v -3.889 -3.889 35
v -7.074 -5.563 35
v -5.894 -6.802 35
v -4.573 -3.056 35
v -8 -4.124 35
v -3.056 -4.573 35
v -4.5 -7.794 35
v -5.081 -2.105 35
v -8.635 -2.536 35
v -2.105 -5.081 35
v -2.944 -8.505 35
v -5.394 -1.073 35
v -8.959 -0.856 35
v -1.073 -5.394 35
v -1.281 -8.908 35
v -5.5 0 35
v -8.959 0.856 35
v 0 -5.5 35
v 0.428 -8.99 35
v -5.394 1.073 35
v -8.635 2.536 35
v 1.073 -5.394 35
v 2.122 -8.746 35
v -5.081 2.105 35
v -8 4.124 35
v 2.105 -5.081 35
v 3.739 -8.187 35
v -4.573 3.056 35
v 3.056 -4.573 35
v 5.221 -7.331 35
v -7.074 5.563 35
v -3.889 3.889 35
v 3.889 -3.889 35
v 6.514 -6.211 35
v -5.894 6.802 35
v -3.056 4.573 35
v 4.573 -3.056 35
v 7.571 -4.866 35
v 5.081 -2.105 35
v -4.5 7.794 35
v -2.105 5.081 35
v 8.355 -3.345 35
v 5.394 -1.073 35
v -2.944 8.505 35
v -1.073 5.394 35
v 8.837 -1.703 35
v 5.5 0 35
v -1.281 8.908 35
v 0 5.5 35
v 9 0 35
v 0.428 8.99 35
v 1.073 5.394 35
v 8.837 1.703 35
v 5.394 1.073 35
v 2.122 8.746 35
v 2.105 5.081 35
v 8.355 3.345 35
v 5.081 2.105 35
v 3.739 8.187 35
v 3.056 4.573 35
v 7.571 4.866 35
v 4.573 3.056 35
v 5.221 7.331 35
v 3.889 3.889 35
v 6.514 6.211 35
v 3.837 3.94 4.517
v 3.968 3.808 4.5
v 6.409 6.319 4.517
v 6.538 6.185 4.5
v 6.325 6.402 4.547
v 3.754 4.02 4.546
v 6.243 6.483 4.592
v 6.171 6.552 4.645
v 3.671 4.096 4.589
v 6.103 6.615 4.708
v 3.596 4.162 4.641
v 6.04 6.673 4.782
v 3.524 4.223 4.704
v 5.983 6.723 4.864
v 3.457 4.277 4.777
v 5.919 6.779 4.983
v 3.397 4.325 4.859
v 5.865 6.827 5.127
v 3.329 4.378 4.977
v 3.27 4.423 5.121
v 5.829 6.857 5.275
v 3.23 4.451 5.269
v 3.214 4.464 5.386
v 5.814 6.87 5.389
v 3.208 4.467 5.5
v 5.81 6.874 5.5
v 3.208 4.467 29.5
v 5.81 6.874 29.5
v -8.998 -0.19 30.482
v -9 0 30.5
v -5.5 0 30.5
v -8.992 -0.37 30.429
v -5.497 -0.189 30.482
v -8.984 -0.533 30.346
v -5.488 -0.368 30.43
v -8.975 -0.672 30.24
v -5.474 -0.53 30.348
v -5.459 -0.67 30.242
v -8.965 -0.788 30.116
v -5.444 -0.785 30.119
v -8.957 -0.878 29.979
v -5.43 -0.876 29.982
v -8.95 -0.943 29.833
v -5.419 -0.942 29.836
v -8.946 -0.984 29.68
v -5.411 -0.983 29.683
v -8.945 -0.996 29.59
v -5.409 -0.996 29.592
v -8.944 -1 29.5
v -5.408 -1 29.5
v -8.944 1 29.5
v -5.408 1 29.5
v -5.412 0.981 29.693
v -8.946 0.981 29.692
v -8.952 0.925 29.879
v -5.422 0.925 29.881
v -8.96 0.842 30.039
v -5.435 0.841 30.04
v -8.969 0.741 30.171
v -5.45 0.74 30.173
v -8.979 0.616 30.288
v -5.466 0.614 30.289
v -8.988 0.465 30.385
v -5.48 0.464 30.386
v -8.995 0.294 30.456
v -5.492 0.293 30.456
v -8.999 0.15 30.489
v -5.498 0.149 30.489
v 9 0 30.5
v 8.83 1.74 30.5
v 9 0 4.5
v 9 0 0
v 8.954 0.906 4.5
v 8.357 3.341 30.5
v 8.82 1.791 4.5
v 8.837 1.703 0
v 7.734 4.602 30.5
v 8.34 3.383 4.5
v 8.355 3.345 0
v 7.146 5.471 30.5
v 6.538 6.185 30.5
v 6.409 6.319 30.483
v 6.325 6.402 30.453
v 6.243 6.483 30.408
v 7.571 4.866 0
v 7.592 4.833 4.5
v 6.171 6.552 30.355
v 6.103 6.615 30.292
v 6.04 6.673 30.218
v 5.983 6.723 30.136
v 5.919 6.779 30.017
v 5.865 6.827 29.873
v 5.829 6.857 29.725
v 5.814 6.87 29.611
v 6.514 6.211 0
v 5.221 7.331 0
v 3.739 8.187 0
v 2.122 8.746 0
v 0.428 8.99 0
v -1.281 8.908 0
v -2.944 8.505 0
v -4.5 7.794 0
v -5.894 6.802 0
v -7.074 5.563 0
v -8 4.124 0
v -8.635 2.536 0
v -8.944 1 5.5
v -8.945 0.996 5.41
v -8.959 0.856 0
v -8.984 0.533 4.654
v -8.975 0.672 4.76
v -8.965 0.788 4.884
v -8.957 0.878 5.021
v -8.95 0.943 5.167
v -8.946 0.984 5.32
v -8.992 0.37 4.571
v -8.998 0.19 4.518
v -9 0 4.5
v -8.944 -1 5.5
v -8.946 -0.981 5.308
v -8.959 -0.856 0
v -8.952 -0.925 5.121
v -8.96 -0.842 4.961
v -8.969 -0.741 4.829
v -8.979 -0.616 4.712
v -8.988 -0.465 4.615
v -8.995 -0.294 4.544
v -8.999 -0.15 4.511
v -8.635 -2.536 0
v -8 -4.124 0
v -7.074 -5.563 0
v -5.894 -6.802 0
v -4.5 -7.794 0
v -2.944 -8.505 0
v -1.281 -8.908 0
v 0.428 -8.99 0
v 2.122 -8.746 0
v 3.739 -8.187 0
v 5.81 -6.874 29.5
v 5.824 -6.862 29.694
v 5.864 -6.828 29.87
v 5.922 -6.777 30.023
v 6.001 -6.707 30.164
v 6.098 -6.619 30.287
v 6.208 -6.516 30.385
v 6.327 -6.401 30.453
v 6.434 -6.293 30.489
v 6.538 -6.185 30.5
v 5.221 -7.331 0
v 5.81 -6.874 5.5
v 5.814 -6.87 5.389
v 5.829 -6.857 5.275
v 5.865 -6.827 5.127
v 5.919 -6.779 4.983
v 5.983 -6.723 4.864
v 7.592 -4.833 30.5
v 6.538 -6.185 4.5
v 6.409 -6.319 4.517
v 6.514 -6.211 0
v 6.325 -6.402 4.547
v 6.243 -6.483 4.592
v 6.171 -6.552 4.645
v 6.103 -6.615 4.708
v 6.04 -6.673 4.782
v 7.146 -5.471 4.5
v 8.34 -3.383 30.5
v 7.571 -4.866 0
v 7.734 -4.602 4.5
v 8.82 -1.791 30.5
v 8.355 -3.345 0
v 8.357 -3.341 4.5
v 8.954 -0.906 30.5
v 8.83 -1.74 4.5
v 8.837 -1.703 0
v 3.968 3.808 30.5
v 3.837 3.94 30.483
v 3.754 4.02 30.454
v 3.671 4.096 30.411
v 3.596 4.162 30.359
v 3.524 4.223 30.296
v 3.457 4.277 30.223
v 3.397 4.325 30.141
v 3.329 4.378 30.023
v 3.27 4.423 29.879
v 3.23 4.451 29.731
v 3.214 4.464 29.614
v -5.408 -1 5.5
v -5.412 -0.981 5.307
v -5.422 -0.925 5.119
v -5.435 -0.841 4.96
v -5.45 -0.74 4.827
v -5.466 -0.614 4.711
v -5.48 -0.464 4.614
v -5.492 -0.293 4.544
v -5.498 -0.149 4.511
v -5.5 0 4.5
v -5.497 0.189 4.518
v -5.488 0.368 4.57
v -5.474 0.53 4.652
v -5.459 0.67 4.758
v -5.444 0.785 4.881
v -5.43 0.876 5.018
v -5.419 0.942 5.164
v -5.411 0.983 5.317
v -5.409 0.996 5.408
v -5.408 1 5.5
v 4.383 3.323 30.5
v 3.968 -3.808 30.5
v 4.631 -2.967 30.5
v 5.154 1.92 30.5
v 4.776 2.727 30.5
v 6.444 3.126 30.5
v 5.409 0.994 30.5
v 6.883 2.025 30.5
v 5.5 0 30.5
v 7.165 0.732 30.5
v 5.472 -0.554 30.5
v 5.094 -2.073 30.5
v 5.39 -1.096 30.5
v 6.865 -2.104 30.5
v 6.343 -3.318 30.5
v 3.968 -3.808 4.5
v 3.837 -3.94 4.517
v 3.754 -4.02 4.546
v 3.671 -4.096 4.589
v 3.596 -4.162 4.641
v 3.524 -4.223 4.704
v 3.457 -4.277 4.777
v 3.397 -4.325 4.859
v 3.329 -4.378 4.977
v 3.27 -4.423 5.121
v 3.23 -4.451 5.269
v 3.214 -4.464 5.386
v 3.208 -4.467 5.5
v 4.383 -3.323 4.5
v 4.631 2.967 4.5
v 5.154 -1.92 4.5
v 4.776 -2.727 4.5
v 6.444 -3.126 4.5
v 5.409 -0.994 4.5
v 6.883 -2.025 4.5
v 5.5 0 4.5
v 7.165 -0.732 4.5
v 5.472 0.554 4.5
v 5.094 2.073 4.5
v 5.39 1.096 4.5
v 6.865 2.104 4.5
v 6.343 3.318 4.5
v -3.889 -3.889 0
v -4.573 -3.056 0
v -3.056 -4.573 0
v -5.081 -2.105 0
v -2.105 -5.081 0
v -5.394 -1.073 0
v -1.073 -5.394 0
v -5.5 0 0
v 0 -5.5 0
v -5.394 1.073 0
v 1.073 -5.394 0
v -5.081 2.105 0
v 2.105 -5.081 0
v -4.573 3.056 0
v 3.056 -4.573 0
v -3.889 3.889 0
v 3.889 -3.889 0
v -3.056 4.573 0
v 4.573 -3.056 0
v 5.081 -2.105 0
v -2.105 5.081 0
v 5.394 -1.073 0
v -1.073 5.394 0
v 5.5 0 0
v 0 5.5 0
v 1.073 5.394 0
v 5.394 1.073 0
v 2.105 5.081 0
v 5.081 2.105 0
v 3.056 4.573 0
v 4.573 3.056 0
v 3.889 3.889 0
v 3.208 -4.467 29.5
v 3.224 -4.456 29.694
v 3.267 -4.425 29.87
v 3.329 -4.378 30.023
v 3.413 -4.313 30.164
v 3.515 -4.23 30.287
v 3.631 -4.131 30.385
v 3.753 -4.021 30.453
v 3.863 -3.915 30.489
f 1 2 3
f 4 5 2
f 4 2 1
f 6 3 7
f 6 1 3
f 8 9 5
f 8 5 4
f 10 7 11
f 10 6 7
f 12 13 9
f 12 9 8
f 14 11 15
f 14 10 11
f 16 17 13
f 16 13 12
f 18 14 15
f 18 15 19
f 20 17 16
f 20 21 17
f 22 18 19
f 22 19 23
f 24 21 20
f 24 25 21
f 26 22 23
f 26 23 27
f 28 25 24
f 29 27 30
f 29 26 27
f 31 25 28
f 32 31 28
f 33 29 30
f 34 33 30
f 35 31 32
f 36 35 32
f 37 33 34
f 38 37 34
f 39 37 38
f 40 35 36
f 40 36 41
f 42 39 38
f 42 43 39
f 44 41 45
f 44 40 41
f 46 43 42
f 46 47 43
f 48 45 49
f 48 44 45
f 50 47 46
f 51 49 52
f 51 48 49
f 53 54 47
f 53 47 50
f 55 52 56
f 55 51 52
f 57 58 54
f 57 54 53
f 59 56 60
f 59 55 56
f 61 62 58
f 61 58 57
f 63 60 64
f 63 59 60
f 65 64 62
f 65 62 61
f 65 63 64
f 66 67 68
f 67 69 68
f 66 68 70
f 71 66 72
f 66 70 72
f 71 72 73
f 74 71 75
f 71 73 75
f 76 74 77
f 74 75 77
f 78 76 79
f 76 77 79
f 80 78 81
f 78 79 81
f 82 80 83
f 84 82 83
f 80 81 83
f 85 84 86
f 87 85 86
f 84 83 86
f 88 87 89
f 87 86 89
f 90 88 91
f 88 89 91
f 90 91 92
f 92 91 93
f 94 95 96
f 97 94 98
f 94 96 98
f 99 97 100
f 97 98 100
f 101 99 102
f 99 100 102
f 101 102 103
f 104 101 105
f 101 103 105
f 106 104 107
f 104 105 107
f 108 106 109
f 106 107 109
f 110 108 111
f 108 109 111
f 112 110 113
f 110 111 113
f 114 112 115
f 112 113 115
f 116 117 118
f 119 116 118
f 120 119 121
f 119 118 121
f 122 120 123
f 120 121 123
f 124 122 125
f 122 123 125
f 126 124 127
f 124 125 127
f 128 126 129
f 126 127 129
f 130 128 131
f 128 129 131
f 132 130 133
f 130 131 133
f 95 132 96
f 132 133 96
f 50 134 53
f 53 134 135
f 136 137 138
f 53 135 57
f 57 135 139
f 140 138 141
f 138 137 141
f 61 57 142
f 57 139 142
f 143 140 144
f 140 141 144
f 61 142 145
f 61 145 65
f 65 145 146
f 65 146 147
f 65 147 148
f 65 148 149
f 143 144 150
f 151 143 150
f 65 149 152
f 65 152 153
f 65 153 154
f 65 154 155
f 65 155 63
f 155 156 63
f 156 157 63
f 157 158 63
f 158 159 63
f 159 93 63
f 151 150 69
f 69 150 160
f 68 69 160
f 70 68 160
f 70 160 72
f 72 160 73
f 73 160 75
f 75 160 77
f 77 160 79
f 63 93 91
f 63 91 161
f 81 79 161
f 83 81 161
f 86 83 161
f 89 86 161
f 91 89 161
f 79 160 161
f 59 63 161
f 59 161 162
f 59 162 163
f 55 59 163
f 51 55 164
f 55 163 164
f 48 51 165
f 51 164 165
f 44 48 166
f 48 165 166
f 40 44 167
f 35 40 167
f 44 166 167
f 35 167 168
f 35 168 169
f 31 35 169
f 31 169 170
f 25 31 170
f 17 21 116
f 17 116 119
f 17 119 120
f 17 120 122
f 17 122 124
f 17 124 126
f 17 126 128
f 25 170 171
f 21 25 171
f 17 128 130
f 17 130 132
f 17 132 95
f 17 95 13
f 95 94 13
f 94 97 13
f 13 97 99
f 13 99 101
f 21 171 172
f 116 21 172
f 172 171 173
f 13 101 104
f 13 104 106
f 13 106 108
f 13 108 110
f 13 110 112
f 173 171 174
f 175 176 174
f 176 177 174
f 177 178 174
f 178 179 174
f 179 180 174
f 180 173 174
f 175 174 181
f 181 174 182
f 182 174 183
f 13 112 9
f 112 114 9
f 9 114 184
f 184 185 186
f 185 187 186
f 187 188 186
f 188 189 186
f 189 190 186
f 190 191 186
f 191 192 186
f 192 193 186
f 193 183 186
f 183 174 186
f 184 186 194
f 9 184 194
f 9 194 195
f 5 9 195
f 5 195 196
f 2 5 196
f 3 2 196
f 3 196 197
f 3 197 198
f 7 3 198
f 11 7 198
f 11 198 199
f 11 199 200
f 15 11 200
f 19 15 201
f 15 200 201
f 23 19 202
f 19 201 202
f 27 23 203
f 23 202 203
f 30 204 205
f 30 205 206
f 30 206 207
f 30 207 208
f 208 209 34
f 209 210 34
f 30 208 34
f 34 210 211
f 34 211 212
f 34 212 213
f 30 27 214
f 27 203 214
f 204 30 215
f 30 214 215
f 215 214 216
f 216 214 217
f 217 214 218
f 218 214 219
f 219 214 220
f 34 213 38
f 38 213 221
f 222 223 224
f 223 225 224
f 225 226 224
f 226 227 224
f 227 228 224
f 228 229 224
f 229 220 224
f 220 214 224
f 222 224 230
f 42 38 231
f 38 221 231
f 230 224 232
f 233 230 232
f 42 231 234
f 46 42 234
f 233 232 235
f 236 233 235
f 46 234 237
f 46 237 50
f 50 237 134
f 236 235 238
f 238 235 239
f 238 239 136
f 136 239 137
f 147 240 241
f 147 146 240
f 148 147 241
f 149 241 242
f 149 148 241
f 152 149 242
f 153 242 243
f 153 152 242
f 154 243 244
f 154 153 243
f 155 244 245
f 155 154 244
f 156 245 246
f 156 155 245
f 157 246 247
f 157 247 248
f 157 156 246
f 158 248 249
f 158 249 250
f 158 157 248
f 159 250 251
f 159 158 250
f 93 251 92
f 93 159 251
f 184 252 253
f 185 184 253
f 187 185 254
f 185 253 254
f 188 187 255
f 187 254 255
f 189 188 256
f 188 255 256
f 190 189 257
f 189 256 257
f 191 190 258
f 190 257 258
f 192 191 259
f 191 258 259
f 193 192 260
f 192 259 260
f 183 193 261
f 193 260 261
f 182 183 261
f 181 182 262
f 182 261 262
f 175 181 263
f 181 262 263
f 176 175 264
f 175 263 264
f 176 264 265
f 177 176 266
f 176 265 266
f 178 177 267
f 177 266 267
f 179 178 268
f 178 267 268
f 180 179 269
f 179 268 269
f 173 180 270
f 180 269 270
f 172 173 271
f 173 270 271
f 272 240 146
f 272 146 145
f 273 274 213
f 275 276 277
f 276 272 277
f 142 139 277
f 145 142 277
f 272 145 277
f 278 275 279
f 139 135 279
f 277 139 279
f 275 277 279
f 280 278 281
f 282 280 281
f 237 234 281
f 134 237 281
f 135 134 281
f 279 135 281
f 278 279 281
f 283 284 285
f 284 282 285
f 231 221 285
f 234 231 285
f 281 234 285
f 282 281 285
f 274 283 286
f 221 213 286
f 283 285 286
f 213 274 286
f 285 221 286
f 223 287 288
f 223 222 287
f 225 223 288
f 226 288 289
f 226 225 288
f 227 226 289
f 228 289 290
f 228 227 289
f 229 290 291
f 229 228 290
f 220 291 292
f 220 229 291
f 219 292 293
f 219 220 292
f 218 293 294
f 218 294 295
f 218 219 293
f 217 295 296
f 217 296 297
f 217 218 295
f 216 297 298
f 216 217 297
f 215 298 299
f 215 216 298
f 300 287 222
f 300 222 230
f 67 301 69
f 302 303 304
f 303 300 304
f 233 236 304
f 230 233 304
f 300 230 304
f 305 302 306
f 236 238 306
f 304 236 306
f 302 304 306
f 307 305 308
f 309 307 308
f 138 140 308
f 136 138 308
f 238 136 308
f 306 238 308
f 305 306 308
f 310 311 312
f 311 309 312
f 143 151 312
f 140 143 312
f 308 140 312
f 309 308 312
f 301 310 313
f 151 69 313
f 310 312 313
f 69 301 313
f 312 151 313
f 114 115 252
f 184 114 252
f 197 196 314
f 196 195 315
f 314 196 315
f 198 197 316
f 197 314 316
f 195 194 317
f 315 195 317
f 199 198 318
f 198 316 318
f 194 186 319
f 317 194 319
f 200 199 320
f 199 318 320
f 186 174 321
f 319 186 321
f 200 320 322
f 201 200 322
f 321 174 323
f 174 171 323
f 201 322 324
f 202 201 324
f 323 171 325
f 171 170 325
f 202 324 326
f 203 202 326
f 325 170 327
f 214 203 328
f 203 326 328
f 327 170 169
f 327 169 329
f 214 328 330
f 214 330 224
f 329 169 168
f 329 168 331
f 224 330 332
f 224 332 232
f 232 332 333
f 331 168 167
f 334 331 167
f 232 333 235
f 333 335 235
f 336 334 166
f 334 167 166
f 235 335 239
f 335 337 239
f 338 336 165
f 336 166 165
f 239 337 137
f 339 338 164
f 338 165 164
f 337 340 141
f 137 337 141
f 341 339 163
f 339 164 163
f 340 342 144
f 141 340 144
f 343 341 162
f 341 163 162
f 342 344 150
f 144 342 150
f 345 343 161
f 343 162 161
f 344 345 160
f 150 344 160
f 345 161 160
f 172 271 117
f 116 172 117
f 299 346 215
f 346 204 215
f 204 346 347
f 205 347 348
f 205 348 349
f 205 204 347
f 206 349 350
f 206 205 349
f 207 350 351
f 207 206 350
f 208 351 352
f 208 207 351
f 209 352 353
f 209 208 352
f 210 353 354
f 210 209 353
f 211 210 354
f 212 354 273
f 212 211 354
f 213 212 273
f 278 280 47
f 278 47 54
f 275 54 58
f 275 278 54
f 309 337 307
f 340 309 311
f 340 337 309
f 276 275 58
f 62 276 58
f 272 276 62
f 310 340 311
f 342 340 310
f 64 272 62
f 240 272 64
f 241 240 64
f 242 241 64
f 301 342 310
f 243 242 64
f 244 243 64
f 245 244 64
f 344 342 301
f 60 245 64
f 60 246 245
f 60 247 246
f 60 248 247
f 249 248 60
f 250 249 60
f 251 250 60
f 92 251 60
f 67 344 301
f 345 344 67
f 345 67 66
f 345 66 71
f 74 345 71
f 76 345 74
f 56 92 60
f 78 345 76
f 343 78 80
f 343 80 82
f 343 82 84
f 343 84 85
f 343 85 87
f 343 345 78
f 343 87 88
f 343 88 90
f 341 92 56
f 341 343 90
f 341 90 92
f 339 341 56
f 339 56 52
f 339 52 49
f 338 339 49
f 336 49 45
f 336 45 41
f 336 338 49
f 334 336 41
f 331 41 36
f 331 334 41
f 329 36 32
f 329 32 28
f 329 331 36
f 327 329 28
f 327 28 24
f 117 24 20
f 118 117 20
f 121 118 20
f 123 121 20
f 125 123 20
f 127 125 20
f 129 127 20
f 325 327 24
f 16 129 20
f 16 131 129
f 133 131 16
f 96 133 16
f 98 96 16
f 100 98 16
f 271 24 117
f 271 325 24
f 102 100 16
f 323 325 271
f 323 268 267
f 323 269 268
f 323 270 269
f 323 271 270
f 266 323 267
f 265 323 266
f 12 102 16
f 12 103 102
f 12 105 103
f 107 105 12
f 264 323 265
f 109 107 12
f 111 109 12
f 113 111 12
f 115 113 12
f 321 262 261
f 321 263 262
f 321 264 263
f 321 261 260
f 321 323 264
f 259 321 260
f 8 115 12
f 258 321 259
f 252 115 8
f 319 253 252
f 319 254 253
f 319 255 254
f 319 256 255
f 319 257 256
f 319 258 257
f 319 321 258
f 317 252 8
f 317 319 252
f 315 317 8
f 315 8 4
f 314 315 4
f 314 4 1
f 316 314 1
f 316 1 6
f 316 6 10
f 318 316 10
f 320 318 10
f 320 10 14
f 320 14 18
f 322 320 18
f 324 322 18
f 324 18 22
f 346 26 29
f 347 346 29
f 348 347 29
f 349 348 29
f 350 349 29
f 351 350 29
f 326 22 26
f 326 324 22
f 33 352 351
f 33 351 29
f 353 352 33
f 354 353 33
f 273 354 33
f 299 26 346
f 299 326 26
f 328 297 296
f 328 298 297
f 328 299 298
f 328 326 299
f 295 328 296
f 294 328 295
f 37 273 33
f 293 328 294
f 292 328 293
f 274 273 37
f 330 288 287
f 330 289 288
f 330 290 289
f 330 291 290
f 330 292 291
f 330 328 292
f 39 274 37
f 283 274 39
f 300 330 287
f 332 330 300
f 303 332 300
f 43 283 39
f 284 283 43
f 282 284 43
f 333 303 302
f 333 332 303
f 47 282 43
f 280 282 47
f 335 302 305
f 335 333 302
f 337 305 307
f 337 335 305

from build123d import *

# Parameters (mm, degrees)
F0_R     = 9
F0_R_2   = 5.5
F1_DEPTH = 35
F3_DEPTH = 25
F4_W     = 3
F4_H     = 26
F6_W     = 40
F6_H     = 26
F8_R     = 1


with BuildPart() as f1:
    # F0 (on Top) → F1 (new body)
    with BuildSketch(Plane.XY):
        Circle(F0_R)
        Circle(F0_R_2, mode=Mode.SUBTRACT)
    extrude(amount=F1_DEPTH)

    # F2 (on Right) → F3 (cut)
    with BuildSketch(Plane.YZ):
        with BuildLine():
            ThreePointArc((0, 4.5), (0.7071067812, 4.7928932188), (1, 5.5))
            Line((1, 5.5), (1, 29.5))
            ThreePointArc((1, 29.5), (0.7071067812, 30.2071067812), (0, 30.5))
            ThreePointArc((0, 30.5), (-0.7071067812, 30.2071067812), (-1, 29.5))
            Line((-1, 29.5), (-1, 5.5))
            ThreePointArc((-1, 5.5), (-0.7071067812, 4.7928932188), (0, 4.5))
        make_face()
    extrude(amount=-F3_DEPTH, mode=Mode.SUBTRACT)

    # F4 (on Right) → F7 section 0
    with BuildSketch(Plane.YZ):
        with Locations((0, 17.5)):
            Rectangle(F4_W, F4_H)
    # F6 (on offset) → F7 section 1
    with BuildSketch(Plane.YZ.offset(20)):
        with Locations((0, 17.5)):
            Rectangle(F6_W, F6_H)
    loft(mode=Mode.SUBTRACT)

    # F8
    f8_edges = [f1.edges().sort_by_distance(p)[0] for p in [
        (4.508802, -5.670642, 30.5),
        (4.508802, 5.670642, 30.5),
        (4.508802, 5.670642, 4.5),
        (4.508802, -5.670642, 4.5),
    ]]
    fillet(f8_edges, radius=F8_R)


solid = f1.part
